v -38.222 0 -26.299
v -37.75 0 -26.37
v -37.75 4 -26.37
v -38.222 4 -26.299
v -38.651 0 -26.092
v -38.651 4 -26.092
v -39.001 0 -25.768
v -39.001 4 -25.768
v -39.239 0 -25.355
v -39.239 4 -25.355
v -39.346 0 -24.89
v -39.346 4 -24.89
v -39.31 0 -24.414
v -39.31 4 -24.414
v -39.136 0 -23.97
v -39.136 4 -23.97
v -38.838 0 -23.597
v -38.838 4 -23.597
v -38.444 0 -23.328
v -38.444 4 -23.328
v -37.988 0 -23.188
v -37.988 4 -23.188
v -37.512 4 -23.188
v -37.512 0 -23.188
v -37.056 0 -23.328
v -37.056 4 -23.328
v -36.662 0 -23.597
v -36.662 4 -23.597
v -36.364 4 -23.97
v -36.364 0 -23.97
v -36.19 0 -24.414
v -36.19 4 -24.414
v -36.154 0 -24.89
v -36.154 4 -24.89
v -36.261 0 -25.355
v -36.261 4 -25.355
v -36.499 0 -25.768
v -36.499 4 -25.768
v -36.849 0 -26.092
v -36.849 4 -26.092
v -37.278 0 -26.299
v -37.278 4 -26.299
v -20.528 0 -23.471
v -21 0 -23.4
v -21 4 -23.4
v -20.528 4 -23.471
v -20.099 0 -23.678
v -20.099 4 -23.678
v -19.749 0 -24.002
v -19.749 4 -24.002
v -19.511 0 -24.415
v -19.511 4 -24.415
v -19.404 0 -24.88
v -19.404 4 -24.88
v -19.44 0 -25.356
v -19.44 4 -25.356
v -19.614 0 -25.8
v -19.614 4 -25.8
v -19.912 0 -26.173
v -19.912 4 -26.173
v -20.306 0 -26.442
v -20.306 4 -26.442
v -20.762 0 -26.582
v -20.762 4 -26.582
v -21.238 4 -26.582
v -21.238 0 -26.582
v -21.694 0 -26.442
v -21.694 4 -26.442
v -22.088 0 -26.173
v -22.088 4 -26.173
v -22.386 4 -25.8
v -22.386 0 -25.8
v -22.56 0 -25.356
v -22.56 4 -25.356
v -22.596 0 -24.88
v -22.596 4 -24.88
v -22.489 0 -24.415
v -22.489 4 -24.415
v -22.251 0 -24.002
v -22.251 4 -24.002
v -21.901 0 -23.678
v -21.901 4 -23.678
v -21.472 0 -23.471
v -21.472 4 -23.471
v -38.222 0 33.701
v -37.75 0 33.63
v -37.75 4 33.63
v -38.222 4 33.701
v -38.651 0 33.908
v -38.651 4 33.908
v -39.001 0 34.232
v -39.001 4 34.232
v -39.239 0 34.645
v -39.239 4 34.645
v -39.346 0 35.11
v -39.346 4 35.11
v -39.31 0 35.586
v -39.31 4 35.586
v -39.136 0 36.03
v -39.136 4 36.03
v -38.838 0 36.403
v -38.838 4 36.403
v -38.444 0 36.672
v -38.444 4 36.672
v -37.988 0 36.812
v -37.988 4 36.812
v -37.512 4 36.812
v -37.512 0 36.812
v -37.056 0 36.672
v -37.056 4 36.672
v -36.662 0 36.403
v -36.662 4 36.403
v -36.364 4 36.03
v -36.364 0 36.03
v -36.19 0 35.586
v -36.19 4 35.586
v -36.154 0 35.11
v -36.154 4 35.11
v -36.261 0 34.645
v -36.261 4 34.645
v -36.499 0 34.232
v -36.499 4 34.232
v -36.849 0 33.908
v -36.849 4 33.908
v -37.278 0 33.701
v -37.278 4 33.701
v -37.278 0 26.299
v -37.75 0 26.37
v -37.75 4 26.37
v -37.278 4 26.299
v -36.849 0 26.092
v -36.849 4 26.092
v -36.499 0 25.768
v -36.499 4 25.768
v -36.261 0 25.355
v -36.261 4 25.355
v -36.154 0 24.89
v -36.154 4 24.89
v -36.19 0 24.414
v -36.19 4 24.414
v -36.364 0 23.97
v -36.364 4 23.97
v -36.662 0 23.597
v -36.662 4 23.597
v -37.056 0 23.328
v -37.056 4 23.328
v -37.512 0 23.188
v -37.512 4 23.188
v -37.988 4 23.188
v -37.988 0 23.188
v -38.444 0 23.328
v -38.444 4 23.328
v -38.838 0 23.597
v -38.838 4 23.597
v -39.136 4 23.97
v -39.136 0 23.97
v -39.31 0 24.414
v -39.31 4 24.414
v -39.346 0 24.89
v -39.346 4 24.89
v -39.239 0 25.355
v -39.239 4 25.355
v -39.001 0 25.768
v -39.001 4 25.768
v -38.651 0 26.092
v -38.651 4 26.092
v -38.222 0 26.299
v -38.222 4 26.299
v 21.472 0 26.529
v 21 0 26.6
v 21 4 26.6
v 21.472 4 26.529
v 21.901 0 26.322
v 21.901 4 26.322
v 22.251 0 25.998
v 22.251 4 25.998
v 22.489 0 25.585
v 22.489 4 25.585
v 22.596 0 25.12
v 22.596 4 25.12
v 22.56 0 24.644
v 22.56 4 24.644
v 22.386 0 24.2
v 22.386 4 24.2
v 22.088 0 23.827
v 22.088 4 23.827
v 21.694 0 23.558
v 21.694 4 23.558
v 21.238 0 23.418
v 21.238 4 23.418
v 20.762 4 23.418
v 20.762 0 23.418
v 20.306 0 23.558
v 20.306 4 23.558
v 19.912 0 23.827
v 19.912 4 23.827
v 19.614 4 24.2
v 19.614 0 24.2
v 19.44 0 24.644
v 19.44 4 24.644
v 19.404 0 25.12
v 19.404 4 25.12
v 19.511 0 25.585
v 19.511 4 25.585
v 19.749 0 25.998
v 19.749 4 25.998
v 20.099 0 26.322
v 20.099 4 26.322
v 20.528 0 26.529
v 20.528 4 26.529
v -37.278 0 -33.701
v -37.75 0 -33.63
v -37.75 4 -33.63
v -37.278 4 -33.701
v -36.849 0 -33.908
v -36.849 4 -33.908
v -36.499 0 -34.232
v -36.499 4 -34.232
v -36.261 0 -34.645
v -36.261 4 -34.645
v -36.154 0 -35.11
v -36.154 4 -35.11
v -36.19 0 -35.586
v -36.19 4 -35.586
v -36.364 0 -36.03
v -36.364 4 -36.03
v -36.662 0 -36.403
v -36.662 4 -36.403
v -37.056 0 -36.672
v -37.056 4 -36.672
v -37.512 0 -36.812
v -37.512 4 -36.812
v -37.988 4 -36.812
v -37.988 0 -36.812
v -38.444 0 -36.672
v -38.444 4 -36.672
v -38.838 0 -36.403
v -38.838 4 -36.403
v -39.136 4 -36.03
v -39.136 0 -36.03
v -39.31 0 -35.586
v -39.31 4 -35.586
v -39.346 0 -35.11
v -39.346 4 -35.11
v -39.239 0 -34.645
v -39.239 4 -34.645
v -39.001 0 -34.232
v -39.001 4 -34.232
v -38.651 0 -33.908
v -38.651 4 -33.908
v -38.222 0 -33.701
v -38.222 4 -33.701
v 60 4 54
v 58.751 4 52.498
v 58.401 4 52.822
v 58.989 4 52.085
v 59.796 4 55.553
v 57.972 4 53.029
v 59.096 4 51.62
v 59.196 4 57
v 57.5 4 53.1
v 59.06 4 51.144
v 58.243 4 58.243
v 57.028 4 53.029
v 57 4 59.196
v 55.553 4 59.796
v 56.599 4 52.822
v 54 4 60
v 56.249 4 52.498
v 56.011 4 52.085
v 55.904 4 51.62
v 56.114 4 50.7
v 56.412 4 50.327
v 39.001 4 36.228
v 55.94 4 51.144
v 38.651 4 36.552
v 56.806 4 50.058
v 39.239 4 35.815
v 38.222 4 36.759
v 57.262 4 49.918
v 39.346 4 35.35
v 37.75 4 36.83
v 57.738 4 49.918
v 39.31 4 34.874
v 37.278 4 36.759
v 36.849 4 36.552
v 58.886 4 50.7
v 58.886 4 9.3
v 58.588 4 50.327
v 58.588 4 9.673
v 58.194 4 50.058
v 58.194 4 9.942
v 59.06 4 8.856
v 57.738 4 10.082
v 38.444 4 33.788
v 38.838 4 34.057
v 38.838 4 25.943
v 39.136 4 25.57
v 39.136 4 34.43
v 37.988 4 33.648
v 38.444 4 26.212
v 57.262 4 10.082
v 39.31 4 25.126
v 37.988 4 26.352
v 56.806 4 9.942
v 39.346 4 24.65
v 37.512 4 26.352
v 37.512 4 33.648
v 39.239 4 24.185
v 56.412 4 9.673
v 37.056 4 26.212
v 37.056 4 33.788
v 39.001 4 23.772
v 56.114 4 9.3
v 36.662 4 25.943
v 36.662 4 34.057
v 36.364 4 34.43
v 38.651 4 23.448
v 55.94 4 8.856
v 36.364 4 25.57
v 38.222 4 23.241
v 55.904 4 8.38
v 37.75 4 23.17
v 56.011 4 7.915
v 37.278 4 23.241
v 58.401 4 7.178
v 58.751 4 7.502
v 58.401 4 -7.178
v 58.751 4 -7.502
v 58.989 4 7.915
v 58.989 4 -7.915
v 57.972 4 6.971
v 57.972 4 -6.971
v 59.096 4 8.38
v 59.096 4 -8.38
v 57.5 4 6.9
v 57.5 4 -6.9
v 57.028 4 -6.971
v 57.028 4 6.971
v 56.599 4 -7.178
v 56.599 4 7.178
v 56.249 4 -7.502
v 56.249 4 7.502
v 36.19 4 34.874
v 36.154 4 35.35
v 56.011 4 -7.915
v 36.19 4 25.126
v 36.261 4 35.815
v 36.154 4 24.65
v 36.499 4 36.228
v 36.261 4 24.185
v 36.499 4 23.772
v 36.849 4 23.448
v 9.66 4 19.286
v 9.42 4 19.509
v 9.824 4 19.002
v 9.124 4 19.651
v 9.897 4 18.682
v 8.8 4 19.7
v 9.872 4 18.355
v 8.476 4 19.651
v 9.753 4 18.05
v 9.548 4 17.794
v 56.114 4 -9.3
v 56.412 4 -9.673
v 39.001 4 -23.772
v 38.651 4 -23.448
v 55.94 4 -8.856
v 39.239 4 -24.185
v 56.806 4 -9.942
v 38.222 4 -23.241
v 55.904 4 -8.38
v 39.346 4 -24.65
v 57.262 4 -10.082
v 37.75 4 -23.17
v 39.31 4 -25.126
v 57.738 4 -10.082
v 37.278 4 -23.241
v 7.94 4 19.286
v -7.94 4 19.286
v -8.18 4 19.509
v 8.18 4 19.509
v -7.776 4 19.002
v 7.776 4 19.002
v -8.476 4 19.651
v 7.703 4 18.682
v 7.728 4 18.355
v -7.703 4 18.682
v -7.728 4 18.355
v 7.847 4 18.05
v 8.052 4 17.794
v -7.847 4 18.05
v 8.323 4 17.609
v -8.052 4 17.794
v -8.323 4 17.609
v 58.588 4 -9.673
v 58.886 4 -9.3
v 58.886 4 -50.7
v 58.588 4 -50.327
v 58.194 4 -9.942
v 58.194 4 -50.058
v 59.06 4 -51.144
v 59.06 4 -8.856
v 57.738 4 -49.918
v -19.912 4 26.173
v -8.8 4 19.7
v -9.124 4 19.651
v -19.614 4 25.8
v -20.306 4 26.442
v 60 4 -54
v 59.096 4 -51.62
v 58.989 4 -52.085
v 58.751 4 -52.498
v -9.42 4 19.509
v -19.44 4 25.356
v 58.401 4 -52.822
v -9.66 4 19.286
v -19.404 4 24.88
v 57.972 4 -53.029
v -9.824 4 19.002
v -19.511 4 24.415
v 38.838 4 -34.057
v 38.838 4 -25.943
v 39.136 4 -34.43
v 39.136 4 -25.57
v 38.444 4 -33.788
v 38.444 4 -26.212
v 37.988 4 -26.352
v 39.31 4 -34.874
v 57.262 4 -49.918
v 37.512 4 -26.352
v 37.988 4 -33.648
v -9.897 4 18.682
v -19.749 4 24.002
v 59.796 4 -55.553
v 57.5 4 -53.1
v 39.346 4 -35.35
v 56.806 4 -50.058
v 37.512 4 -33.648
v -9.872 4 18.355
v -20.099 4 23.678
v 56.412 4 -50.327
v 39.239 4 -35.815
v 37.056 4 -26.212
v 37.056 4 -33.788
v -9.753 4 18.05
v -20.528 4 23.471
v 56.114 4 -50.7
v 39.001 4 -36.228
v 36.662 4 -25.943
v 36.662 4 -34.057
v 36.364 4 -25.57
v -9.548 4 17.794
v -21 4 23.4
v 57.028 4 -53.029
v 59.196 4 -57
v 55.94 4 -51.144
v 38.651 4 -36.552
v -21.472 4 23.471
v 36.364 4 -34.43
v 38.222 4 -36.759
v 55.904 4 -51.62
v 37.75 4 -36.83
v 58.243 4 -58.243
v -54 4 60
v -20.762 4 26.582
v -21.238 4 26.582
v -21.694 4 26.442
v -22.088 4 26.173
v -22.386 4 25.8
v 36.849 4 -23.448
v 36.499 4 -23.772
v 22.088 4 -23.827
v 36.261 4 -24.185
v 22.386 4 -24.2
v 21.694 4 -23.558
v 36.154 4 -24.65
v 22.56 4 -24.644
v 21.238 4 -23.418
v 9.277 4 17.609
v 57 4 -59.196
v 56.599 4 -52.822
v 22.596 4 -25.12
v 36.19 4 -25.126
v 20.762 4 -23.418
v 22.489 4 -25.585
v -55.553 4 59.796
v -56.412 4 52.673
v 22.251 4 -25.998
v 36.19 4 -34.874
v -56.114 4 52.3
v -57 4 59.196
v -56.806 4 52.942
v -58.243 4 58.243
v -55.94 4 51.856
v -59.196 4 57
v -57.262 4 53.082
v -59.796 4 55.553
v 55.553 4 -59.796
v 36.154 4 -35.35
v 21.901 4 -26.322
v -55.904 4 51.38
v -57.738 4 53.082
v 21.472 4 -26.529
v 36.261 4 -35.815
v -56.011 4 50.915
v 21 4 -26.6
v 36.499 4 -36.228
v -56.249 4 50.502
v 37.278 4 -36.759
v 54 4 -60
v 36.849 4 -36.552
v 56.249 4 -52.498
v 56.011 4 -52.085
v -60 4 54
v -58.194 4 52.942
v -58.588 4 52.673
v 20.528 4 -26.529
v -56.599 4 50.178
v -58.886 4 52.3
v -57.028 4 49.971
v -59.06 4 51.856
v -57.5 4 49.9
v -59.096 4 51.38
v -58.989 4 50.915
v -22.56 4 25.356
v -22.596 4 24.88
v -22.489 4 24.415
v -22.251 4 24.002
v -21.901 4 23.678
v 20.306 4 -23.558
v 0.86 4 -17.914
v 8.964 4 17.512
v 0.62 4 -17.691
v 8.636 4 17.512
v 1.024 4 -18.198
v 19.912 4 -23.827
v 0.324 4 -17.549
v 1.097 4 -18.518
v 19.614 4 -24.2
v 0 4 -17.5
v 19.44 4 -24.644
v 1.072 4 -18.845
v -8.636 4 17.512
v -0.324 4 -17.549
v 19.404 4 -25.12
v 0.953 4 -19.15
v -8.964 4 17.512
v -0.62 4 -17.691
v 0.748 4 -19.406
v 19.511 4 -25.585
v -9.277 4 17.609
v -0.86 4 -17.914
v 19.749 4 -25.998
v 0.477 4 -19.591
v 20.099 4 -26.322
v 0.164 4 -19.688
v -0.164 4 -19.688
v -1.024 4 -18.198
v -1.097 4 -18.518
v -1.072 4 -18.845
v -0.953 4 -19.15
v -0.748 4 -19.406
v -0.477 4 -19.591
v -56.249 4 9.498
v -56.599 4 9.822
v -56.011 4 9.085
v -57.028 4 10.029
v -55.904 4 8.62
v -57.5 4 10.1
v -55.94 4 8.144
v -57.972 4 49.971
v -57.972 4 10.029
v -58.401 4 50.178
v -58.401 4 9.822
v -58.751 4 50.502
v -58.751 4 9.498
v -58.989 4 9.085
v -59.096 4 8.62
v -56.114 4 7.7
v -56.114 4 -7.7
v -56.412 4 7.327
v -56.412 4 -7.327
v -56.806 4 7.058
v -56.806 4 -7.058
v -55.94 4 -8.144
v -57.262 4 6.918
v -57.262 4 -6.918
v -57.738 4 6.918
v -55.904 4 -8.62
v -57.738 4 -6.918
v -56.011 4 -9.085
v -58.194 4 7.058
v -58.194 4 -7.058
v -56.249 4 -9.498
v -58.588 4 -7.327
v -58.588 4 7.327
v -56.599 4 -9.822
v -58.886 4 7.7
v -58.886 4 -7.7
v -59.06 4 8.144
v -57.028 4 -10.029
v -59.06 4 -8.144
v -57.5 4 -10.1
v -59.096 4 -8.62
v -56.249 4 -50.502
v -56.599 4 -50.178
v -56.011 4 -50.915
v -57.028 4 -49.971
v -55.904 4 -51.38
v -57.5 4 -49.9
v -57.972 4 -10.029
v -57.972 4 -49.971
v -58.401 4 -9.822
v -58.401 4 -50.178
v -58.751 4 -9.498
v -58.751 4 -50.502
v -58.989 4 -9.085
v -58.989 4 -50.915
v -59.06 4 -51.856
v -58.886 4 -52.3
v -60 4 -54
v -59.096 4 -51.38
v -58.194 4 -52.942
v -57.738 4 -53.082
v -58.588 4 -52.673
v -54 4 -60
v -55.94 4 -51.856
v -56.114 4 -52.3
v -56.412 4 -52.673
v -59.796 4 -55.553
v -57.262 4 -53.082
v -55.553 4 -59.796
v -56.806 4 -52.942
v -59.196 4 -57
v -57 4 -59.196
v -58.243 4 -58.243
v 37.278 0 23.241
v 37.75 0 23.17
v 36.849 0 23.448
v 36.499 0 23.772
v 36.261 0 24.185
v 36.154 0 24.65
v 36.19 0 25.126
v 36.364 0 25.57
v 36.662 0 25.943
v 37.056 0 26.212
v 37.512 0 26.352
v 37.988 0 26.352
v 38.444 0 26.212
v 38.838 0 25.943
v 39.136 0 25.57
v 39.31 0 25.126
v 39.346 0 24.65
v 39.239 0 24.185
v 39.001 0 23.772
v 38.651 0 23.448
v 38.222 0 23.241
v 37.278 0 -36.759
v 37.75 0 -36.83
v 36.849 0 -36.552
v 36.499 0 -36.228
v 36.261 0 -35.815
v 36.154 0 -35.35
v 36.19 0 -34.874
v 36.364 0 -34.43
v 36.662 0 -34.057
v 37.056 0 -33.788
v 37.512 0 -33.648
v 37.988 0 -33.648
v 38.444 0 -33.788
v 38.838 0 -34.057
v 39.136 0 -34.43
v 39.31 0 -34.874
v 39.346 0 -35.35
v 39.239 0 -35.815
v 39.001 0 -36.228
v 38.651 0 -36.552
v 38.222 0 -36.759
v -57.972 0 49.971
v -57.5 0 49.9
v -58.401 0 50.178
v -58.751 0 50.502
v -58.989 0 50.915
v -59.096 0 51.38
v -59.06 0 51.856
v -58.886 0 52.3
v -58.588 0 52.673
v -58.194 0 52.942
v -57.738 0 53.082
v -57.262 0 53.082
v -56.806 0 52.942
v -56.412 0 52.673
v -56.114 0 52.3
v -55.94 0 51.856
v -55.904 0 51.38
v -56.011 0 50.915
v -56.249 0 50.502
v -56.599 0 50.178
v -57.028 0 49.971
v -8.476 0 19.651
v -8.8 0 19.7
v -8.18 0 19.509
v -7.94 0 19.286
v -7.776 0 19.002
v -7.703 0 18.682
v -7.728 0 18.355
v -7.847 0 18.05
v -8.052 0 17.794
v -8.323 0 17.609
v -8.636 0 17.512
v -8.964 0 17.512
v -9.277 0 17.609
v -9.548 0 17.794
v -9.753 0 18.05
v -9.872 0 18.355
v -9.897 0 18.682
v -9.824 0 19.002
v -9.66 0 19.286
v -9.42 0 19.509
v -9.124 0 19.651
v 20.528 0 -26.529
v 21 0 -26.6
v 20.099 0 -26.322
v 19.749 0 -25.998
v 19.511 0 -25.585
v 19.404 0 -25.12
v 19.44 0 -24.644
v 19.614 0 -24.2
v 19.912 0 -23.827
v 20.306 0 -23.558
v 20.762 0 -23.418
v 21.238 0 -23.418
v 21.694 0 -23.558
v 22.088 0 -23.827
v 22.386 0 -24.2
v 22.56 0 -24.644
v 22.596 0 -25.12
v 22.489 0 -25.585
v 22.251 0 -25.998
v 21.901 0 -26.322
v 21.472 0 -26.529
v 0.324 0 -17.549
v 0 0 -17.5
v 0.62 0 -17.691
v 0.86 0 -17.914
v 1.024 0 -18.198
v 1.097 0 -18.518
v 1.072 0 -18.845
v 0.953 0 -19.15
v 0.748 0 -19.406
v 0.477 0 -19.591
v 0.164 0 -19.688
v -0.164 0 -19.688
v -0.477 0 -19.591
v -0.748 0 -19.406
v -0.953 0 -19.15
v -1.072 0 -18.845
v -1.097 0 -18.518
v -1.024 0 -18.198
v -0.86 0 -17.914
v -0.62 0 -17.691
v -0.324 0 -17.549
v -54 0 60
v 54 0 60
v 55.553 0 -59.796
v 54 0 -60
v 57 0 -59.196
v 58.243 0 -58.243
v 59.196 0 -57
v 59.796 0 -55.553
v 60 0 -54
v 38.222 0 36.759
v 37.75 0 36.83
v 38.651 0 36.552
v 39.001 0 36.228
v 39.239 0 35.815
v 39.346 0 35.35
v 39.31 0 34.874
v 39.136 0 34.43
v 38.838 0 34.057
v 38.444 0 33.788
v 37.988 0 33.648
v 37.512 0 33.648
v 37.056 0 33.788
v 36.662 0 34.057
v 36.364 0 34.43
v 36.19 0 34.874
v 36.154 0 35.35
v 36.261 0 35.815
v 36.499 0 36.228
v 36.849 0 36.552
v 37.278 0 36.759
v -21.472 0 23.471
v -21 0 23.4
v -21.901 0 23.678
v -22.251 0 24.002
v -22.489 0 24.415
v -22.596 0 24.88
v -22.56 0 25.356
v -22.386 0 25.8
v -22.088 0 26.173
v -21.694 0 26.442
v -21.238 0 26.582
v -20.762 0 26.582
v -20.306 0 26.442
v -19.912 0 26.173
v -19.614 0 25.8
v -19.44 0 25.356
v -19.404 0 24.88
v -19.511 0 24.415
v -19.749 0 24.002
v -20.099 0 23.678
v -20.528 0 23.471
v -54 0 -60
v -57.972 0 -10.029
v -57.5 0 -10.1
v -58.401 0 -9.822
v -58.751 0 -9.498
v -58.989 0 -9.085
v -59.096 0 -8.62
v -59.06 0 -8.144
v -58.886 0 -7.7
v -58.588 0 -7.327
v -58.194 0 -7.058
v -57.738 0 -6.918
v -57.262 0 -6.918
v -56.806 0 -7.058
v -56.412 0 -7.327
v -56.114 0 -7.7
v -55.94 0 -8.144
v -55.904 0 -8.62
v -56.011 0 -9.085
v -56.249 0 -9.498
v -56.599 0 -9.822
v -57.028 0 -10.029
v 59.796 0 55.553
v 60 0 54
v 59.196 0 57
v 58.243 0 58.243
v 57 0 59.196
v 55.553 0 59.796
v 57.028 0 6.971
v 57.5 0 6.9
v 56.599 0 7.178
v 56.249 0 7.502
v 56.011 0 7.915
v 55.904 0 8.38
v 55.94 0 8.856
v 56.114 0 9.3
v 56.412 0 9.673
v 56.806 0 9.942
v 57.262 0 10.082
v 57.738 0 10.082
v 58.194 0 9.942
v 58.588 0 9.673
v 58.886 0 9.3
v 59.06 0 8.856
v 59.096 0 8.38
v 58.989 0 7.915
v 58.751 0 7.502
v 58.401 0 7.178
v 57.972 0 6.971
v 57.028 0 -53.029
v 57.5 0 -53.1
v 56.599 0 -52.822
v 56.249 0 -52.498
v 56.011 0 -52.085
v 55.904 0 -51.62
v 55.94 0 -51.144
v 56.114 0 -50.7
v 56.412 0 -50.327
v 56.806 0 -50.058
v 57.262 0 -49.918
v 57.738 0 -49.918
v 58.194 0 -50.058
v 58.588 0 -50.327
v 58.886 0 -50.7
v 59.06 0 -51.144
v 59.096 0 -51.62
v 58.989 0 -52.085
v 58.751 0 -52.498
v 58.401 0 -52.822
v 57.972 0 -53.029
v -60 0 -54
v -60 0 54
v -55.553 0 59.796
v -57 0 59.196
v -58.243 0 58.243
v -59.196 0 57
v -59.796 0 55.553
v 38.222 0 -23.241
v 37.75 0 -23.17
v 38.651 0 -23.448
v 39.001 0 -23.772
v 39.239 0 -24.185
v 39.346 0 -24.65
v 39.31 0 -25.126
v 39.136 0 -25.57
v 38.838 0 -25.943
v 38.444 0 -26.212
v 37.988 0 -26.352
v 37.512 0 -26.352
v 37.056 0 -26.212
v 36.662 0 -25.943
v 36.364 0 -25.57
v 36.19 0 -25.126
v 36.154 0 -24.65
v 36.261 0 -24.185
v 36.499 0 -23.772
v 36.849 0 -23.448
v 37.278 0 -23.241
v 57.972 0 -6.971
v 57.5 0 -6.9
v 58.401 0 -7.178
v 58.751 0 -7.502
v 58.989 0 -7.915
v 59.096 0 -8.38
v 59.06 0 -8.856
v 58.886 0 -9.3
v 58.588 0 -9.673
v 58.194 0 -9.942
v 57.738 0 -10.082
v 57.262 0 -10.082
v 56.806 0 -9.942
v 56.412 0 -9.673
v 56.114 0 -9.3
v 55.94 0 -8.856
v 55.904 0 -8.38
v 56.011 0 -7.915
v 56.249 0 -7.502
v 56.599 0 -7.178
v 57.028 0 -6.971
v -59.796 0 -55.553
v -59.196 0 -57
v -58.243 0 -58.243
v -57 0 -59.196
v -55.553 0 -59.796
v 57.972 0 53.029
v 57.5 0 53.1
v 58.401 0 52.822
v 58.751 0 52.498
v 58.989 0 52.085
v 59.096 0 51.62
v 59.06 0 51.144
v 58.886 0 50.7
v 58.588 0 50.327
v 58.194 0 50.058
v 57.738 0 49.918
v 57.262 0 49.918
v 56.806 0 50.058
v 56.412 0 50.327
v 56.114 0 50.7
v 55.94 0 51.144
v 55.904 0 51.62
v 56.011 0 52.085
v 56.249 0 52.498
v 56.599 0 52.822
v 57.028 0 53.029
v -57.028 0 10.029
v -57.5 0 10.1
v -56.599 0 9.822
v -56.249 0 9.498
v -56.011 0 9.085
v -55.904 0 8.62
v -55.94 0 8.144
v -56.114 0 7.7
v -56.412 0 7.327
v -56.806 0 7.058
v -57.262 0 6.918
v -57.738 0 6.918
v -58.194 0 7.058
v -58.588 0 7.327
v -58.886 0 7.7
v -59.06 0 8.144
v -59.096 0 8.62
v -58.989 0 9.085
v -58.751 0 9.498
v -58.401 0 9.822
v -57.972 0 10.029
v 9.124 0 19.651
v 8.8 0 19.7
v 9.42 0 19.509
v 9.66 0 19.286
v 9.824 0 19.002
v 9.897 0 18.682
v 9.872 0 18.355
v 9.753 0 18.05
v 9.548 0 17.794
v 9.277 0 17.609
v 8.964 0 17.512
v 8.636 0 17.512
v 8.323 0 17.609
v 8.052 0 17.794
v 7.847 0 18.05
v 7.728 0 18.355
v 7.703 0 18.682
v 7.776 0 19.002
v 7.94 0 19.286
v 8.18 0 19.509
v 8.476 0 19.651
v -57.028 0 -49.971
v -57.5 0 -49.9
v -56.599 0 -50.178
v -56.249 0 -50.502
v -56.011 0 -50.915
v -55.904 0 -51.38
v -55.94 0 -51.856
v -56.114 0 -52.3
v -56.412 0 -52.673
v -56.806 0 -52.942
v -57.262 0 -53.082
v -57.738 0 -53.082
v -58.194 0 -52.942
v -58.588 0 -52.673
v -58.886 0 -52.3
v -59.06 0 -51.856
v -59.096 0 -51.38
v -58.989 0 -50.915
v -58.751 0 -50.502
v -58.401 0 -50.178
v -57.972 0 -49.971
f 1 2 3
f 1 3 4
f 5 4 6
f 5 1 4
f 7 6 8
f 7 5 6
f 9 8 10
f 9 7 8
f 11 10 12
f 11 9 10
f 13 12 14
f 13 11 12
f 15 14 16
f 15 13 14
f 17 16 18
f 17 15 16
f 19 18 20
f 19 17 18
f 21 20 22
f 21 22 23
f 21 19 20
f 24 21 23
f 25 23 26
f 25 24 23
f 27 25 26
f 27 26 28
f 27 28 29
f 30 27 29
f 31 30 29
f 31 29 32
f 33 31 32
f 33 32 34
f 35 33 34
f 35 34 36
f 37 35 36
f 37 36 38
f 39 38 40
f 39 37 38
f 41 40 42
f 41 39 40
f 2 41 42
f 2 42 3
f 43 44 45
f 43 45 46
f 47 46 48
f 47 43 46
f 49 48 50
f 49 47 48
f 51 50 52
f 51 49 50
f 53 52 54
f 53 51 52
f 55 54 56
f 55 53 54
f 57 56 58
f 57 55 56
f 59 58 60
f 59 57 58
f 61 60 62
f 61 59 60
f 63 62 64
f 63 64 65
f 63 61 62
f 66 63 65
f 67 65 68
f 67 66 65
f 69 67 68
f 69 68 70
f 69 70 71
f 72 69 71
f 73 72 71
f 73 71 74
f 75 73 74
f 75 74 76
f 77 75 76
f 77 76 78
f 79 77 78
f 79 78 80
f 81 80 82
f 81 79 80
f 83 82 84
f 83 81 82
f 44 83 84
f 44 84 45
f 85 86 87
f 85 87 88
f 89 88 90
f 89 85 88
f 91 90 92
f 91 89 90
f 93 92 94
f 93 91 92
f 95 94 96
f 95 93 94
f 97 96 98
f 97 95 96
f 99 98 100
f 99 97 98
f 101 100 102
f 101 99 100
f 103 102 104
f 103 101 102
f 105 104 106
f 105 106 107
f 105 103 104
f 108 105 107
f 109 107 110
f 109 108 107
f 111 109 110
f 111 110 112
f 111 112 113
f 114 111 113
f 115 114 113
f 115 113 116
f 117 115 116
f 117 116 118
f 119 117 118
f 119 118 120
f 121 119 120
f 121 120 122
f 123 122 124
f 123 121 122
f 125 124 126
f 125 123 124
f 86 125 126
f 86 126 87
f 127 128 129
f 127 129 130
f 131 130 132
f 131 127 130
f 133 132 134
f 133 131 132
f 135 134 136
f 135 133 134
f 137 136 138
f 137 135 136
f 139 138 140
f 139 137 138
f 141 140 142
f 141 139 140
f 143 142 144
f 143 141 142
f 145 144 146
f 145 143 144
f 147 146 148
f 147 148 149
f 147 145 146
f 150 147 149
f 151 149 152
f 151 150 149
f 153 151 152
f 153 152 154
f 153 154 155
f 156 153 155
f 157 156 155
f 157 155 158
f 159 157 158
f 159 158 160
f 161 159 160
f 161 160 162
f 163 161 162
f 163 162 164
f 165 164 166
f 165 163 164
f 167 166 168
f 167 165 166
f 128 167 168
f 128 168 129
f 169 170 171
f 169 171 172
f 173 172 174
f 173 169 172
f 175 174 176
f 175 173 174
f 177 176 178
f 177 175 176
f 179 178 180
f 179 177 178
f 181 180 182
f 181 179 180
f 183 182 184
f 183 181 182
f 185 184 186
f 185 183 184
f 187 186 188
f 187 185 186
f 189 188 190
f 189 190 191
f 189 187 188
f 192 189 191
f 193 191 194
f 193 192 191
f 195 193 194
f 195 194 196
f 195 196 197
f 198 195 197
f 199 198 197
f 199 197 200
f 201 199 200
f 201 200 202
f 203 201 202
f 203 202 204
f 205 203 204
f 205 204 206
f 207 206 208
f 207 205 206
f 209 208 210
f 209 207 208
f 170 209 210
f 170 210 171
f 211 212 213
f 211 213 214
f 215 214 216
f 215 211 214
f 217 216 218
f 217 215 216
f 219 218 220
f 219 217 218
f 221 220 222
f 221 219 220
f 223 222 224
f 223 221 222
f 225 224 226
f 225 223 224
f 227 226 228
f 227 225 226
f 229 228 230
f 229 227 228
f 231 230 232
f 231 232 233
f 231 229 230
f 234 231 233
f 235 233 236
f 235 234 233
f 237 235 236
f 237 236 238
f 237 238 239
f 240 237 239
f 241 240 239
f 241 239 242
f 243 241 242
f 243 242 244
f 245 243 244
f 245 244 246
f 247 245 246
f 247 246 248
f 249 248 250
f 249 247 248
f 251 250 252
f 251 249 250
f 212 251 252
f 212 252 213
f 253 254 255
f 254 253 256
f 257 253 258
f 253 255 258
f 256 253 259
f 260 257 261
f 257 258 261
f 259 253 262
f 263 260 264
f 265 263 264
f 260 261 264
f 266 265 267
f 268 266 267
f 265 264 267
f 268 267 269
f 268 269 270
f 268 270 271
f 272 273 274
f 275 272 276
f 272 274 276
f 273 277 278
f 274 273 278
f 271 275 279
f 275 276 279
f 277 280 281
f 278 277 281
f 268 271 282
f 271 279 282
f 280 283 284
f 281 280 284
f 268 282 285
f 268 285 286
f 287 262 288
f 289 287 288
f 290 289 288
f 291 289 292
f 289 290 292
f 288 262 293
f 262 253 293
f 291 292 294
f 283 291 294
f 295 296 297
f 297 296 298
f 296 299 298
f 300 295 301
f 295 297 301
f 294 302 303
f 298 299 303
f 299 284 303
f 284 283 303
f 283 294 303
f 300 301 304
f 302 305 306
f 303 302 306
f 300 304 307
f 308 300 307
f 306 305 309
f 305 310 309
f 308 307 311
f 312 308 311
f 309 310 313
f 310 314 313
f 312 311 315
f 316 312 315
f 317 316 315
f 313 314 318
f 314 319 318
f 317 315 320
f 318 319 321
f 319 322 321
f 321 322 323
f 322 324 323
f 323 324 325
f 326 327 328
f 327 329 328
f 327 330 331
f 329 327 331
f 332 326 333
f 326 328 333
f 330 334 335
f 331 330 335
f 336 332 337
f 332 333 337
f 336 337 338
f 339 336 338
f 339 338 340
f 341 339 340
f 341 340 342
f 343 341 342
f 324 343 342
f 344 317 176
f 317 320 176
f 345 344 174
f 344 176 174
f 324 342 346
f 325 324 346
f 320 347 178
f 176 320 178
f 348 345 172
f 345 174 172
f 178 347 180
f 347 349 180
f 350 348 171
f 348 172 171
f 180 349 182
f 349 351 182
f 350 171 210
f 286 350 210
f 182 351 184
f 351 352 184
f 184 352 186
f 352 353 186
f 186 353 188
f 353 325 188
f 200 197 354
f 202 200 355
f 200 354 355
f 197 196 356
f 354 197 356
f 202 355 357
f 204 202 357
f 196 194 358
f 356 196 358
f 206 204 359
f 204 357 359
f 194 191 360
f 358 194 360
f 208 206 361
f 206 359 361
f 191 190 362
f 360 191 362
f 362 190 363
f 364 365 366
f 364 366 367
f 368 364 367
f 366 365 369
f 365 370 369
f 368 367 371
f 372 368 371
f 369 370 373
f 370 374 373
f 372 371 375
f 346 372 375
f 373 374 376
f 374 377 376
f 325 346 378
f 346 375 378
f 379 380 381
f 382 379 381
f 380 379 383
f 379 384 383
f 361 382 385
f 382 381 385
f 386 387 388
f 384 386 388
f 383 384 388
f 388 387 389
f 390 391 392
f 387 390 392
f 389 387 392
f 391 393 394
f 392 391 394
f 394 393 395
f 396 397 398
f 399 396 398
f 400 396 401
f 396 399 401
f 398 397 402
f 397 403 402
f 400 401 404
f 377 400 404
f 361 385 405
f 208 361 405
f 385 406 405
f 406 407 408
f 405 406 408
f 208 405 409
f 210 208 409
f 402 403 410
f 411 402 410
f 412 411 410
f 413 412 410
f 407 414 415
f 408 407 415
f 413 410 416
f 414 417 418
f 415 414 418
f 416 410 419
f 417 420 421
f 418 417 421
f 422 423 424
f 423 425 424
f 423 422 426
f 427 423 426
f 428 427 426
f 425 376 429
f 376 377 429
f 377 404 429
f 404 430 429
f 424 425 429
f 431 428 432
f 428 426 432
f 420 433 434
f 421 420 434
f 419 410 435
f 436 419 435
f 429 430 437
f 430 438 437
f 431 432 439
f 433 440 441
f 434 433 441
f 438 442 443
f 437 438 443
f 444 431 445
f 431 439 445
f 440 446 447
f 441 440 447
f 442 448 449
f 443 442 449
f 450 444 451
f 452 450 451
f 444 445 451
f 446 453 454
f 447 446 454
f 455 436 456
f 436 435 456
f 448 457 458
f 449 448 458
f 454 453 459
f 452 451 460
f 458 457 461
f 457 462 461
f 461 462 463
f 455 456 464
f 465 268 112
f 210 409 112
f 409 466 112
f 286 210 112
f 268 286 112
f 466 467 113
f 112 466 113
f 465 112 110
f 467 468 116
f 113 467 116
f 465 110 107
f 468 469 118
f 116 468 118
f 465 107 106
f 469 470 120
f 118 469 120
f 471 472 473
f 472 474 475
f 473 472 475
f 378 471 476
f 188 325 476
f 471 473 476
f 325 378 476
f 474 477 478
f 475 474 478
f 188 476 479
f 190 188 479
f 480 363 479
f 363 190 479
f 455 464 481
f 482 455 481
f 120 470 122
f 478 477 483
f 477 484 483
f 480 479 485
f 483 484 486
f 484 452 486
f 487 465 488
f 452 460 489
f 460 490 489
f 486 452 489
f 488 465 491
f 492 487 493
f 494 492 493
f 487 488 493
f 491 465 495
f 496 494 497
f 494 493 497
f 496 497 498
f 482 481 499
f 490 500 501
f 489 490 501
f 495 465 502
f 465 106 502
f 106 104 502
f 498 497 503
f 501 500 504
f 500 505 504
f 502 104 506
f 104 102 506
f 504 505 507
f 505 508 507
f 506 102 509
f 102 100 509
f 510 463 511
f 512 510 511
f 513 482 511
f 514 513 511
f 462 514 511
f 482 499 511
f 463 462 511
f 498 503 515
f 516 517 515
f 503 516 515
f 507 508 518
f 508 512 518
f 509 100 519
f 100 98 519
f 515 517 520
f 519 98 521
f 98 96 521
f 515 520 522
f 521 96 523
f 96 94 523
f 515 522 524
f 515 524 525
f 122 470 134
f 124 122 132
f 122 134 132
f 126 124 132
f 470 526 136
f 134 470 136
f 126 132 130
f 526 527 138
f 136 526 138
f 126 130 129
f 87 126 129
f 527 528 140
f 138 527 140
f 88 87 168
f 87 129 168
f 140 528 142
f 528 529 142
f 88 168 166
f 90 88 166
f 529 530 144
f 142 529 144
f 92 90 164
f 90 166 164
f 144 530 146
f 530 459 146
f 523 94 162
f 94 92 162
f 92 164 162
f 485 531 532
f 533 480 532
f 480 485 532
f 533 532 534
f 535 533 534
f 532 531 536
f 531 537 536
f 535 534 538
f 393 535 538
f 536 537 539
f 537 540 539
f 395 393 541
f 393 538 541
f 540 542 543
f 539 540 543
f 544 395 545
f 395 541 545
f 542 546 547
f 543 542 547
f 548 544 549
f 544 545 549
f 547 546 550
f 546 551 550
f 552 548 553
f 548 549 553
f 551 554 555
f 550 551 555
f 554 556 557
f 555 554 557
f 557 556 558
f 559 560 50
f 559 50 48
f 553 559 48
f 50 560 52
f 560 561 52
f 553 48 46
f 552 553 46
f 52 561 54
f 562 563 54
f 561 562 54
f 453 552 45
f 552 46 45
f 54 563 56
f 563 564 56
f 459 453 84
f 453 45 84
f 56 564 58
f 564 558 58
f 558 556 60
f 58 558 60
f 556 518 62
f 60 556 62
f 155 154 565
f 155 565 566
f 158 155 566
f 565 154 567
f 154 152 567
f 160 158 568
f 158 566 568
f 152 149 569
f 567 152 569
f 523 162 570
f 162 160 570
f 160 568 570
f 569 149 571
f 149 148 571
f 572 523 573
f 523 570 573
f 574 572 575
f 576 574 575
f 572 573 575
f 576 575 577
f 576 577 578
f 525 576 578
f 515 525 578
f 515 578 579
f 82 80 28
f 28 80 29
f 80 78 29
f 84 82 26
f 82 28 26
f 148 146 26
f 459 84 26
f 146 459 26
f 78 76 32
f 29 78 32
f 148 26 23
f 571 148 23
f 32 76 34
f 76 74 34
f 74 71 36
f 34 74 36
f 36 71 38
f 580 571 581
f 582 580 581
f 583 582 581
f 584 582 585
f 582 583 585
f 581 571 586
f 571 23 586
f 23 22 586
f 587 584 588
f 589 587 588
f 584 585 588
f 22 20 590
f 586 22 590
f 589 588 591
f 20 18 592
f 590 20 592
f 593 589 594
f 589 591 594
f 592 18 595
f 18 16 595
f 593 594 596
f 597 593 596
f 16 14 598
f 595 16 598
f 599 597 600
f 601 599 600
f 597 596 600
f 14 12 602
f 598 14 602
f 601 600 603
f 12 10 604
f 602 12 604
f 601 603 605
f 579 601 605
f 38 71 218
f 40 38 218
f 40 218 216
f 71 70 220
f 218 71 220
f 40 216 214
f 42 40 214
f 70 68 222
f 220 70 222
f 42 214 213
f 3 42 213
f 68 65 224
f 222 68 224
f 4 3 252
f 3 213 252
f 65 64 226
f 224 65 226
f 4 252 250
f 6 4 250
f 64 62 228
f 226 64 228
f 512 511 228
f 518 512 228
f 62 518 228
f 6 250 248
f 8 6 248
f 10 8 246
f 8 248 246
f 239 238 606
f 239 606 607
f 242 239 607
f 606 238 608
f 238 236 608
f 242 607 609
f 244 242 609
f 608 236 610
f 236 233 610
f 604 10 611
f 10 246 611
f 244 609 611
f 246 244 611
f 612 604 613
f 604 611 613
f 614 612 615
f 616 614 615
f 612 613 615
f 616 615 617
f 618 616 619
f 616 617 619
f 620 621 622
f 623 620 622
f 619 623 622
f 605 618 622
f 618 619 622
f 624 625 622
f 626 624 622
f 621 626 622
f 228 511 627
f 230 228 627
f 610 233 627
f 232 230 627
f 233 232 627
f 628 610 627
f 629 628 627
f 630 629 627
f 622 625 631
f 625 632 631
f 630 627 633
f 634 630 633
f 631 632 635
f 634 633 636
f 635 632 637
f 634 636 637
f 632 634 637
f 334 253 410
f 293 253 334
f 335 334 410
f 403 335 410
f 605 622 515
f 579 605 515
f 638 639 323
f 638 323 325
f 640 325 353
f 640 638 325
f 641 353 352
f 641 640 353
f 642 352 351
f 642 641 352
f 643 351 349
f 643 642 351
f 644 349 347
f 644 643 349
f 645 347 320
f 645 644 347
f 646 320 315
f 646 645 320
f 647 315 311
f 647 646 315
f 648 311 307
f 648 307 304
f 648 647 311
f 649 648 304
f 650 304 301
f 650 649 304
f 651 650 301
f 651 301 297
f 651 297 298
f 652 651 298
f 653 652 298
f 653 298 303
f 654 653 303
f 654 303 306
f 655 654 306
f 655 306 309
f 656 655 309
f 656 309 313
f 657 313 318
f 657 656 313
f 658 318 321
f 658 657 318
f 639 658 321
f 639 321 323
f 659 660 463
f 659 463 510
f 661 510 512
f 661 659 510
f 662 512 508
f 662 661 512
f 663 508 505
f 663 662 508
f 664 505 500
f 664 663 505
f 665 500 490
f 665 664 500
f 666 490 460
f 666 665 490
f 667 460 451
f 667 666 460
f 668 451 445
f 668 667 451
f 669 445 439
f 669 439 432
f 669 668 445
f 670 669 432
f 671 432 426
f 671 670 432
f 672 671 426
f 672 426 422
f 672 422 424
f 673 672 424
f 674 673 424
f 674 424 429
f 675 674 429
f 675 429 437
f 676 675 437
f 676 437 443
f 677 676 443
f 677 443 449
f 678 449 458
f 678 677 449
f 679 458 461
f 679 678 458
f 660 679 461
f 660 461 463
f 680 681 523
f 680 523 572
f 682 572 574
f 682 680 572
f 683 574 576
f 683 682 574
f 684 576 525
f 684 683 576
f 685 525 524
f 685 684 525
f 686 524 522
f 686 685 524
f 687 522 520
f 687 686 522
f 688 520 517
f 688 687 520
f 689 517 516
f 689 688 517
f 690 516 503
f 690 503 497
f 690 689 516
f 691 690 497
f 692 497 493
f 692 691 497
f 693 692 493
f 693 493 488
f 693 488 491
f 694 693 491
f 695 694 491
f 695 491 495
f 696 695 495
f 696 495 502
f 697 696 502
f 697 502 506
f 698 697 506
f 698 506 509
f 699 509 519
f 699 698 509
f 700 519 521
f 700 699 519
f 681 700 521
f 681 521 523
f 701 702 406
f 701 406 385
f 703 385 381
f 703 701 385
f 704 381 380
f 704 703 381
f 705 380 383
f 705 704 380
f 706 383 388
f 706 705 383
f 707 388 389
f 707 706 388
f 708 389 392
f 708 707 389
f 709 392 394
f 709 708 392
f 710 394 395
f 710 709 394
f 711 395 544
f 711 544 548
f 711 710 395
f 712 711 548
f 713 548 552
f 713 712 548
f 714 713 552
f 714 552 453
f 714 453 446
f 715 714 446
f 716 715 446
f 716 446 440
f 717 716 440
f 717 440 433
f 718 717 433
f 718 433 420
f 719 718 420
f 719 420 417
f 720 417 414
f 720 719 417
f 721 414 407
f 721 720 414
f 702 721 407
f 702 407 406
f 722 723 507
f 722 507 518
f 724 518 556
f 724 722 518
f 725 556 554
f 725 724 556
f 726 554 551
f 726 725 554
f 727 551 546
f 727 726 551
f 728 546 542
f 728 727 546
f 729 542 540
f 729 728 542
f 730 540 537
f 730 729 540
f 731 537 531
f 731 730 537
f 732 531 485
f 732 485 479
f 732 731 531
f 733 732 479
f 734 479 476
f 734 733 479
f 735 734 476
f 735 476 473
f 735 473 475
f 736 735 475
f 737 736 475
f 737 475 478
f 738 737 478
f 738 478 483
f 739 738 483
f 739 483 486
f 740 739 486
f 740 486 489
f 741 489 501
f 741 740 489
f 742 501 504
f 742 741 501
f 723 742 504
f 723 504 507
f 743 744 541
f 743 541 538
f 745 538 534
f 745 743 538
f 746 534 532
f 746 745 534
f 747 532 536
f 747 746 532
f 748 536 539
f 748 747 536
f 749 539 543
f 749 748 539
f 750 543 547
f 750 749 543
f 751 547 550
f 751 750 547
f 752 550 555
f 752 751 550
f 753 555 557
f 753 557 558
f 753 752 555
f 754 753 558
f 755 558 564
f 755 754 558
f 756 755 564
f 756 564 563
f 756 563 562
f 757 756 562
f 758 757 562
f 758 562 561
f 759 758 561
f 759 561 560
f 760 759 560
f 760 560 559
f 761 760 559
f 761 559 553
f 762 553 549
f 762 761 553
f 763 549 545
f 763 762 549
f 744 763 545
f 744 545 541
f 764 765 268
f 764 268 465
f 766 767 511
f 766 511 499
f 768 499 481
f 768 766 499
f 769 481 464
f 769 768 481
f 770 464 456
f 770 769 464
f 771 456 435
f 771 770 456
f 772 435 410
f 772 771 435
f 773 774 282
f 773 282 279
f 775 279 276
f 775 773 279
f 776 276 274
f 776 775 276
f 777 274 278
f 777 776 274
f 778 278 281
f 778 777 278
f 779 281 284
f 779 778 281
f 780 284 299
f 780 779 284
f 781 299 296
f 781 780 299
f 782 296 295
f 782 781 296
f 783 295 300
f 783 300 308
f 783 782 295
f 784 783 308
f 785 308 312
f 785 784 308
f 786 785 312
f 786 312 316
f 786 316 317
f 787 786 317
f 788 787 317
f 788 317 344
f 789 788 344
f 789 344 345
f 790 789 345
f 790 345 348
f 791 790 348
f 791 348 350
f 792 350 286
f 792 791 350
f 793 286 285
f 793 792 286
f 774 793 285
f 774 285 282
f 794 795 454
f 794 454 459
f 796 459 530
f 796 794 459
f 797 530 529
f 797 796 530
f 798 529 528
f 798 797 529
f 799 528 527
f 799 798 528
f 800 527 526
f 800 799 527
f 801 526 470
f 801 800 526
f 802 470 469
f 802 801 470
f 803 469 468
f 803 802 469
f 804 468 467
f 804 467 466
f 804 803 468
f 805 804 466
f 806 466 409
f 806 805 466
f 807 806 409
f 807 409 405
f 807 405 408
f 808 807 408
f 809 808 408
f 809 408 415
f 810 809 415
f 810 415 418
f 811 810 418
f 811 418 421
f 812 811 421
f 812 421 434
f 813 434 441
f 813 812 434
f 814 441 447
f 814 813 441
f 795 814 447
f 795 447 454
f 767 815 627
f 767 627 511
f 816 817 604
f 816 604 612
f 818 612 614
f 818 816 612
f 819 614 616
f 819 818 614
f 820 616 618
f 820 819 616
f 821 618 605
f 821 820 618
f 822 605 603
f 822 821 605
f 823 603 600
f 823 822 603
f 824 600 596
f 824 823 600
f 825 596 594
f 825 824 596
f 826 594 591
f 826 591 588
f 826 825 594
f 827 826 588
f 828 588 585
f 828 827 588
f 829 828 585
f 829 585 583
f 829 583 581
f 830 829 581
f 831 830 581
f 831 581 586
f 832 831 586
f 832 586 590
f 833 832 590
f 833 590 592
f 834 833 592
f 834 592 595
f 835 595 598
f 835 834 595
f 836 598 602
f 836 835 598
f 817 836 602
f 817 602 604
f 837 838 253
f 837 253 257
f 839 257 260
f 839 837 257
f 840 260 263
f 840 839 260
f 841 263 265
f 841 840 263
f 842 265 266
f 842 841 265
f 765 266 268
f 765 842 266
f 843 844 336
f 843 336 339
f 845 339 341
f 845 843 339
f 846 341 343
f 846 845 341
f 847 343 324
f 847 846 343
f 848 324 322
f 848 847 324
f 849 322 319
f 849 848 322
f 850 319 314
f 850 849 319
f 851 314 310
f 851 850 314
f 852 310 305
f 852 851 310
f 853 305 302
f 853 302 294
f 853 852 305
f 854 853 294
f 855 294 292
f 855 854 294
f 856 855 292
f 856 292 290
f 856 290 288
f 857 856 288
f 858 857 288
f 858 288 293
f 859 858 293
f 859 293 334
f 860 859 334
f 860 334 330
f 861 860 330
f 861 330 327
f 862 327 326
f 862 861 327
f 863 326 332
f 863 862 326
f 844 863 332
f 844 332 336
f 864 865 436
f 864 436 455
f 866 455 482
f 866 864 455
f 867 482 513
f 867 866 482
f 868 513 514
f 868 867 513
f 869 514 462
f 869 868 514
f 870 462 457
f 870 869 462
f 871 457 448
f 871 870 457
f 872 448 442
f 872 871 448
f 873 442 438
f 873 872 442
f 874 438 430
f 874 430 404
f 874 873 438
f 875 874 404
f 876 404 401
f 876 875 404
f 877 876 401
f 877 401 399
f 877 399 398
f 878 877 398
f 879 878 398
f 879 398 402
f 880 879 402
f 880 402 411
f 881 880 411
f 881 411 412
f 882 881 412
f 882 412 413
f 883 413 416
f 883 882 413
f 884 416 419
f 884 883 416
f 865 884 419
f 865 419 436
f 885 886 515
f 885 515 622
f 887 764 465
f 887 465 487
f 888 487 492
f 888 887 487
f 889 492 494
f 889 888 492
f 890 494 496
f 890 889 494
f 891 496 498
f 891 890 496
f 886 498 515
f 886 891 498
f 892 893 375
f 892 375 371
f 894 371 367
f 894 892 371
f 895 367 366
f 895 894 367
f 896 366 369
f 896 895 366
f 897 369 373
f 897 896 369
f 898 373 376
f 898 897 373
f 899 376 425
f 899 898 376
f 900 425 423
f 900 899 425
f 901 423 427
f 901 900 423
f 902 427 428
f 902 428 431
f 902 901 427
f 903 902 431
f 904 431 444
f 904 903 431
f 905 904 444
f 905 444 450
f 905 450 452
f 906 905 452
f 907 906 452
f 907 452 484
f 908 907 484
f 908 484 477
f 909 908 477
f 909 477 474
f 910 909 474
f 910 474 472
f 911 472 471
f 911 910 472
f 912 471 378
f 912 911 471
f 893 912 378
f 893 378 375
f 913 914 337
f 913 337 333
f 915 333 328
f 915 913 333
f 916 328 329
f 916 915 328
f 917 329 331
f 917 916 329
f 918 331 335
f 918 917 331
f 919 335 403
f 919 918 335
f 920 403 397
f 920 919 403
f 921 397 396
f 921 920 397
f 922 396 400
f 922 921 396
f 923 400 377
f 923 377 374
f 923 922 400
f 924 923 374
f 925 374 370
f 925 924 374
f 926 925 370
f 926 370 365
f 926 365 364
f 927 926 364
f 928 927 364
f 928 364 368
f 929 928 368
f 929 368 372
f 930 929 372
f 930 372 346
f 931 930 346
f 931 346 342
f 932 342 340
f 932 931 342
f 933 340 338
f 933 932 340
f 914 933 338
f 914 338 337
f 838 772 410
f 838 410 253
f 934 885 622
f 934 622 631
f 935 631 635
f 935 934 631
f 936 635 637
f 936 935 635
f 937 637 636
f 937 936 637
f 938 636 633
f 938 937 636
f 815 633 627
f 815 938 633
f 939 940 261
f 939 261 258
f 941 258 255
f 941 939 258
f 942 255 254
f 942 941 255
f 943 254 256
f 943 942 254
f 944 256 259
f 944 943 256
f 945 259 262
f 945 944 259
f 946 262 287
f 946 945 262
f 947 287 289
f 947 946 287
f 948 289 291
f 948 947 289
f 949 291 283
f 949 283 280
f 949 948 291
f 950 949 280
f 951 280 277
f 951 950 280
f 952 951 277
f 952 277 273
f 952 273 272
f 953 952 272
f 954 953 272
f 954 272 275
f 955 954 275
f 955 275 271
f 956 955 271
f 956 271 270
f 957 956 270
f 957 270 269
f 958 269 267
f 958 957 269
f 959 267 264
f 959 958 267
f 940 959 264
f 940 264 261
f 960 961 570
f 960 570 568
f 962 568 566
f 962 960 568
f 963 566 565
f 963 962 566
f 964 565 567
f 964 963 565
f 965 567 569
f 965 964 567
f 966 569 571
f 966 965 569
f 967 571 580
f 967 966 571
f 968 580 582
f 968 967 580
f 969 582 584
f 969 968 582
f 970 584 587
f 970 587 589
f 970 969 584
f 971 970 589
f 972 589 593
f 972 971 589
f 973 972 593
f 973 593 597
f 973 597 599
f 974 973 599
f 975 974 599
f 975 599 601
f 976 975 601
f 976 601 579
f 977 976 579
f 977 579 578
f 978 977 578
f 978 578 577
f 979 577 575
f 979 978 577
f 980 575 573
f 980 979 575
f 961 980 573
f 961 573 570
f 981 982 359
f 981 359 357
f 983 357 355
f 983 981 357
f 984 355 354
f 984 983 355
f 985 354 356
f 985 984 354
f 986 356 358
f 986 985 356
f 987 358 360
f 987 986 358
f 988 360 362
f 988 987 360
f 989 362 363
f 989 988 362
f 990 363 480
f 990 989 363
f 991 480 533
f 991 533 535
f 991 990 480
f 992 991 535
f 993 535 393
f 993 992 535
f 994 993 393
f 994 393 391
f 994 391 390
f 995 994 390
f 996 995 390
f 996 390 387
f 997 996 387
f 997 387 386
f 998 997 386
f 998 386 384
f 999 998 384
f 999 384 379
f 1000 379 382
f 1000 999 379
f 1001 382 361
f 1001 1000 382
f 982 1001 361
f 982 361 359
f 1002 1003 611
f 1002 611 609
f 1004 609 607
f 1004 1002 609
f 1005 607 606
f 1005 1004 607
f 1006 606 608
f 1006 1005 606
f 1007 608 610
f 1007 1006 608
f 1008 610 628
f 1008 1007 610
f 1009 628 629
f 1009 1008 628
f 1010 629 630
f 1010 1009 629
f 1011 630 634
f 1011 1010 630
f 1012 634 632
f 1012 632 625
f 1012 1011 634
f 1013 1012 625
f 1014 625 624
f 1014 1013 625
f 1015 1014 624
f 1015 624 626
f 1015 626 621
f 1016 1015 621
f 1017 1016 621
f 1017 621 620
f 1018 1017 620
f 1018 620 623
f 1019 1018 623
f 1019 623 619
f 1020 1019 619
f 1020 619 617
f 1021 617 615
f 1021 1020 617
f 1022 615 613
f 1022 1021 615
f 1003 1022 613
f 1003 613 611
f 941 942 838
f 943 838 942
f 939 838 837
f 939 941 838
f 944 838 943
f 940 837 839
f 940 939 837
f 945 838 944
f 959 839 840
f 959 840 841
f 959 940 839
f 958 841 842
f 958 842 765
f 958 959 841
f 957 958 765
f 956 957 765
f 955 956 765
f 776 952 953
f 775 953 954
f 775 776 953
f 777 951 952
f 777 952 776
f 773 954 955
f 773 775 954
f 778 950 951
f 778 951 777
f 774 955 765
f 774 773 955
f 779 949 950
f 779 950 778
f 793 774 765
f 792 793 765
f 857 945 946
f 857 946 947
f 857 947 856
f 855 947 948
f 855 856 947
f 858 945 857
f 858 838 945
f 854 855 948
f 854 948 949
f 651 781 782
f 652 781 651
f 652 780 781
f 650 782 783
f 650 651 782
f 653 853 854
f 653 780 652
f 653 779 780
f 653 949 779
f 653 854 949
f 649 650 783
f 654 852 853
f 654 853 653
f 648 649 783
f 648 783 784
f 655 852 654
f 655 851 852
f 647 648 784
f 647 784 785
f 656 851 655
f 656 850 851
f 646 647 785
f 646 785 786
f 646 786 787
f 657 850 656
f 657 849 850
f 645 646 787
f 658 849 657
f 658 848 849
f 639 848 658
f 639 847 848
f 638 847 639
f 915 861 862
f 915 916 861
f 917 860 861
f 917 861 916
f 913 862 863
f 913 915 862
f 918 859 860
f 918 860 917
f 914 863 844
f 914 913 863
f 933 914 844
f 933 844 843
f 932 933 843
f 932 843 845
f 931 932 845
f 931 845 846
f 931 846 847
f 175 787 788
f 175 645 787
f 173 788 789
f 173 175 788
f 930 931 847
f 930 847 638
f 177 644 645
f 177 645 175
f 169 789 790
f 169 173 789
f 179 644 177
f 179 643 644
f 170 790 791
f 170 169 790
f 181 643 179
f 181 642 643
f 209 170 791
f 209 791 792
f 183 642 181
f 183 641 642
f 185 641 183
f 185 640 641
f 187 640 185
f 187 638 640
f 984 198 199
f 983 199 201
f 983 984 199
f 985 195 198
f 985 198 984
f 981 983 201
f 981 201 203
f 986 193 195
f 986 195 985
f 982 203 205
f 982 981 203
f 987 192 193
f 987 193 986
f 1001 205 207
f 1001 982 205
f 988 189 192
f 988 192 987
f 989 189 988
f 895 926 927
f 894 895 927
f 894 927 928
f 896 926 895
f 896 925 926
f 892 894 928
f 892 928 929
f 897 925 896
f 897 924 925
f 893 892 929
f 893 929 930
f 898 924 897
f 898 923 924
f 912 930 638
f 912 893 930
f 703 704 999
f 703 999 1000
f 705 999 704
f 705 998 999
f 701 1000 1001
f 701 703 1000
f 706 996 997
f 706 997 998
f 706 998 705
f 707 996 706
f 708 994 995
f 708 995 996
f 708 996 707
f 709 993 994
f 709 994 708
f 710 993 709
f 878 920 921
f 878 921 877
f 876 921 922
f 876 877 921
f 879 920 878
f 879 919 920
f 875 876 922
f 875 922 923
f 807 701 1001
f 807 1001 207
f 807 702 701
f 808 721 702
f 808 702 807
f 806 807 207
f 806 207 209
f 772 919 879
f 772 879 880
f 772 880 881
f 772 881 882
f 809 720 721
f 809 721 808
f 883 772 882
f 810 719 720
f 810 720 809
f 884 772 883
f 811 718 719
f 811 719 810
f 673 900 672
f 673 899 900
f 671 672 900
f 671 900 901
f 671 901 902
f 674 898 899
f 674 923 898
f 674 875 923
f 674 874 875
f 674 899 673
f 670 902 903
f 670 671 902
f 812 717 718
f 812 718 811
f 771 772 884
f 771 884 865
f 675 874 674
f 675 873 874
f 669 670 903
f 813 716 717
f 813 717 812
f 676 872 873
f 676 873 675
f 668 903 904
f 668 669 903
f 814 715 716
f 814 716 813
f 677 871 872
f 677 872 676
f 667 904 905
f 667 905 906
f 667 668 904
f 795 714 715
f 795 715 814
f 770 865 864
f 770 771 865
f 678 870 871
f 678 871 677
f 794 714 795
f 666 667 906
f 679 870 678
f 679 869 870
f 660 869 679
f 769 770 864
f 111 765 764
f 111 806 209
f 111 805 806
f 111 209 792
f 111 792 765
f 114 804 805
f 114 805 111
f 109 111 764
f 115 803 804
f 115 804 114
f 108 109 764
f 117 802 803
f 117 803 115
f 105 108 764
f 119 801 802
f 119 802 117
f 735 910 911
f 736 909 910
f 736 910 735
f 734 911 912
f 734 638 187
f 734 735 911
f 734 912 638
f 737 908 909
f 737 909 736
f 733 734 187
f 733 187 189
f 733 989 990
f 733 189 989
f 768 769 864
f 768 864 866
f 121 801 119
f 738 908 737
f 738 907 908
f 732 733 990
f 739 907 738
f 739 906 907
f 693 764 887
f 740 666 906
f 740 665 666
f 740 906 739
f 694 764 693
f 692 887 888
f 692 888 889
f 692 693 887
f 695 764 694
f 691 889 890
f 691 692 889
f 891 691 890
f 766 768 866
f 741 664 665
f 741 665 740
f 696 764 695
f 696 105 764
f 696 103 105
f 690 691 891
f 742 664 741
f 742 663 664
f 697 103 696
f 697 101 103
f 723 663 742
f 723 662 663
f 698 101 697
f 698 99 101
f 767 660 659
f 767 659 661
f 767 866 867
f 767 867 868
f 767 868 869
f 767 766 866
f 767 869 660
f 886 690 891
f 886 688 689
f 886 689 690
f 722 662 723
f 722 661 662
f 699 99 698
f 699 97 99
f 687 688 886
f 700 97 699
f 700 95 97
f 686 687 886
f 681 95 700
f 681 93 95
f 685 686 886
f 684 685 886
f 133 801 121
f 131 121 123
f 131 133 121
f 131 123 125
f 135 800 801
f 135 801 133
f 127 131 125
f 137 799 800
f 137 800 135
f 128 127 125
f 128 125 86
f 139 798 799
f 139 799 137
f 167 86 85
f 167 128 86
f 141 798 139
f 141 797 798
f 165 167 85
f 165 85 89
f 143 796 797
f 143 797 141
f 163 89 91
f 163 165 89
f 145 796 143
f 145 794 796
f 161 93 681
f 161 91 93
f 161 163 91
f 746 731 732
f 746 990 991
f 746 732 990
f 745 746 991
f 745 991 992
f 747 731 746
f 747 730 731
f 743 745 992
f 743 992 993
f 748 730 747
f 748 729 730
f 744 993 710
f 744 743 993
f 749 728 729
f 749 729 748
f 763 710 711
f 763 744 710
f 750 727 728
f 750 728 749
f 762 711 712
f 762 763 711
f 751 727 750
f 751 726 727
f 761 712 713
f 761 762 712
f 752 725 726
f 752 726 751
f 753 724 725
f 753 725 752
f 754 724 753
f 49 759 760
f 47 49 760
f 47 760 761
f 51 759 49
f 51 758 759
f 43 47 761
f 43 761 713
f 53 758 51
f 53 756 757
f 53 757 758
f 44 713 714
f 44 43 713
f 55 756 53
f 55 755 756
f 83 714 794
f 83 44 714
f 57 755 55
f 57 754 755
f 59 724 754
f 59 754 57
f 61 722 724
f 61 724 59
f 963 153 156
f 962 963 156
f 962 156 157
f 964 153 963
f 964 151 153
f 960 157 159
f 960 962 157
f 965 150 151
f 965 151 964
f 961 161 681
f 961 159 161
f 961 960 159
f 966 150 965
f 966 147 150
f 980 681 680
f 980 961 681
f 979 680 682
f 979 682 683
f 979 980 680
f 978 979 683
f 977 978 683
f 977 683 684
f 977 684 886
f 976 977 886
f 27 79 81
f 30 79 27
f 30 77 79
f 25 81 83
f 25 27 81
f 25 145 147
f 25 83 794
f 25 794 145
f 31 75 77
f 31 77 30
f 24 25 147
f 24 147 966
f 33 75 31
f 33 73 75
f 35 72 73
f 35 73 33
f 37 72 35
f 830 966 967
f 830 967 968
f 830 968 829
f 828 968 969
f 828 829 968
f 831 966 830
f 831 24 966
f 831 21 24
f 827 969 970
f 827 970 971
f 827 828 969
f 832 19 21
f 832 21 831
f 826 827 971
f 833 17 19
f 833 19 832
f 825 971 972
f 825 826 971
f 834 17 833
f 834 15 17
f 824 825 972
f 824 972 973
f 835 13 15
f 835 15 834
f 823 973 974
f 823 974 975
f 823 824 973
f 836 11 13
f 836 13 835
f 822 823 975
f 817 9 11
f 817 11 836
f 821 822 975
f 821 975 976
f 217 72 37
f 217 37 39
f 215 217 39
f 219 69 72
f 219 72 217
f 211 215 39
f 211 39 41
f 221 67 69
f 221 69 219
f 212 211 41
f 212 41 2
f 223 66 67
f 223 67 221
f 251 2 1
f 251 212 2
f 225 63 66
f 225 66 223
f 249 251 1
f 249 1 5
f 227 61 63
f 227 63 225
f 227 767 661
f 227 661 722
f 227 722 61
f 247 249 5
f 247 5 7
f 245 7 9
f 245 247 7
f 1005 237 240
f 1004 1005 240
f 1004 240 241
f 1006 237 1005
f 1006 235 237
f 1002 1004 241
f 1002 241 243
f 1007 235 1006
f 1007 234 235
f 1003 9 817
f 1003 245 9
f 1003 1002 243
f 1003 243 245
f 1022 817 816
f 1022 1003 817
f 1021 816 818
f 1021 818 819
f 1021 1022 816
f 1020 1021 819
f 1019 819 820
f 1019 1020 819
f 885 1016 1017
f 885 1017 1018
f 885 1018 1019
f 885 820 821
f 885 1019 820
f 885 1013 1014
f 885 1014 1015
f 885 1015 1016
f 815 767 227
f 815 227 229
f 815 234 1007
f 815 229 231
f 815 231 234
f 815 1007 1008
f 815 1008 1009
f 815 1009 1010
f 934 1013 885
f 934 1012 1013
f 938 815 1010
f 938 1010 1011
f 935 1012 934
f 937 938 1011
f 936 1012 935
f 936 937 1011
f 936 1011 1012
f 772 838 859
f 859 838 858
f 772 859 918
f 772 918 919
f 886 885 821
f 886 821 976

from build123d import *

# Parameters (mm, degrees)
SKETCH_1_R      = 1.6
SKETCH_1_R_2    = 1.1
EXTRUDE_1_DEPTH = 4


with BuildPart() as part:
    # 草图1 → 凸台-拉伸1 (new body)
    with BuildSketch(Plane(origin=(0, 0, 0), x_dir=(1, 0, 0), z_dir=(0, 1, 0))):
        with BuildLine():
            Line((-54, 60), (54, 60))
            ThreePointArc((54, 60), (58.242640687, 58.242640687), (60, 54))
            Line((60, 54), (60, -54))
            ThreePointArc((60, -54), (58.242640687, -58.242640687), (54, -60))
            Line((54, -60), (-54, -60))
            ThreePointArc((-54, -60), (-58.242640687, -58.242640687), (-60, -54))
            Line((-60, -54), (-60, 54))
            ThreePointArc((-60, 54), (-58.242640687, 58.242640687), (-54, 60))
        make_face()
        with Locations(Location((-57.5, 51.5, 0), (0, 0, 270))):
            Circle(SKETCH_1_R, mode=Mode.SUBTRACT)
        with Locations(Location((-57.5, 8.5, 0), (0, 0, 90))):
            Circle(SKETCH_1_R, mode=Mode.SUBTRACT)
        with Locations(Location((-37.75, 35.23, 0), (0, 0, 270))):
            Circle(SKETCH_1_R, mode=Mode.SUBTRACT)
        with Locations(Location((-37.75, 24.77, 0), (0, 0, 90))):
            Circle(SKETCH_1_R, mode=Mode.SUBTRACT)
        with Locations(Location((-57.5, -8.5, 0), (0, 0, 270))):
            Circle(SKETCH_1_R, mode=Mode.SUBTRACT)
        with Locations(Location((-37.75, -24.77, 0), (0, 0, 270))):
            Circle(SKETCH_1_R, mode=Mode.SUBTRACT)
        with Locations(Location((-37.75, -35.23, 0), (0, 0, 90))):
            Circle(SKETCH_1_R, mode=Mode.SUBTRACT)
        with Locations(Location((-57.5, -51.5, 0), (0, 0, 90))):
            Circle(SKETCH_1_R, mode=Mode.SUBTRACT)
        with Locations(Location((57.5, -51.5, 0), (0, 0, 270))):
            Circle(SKETCH_1_R, mode=Mode.SUBTRACT)
        with Locations(Location((37.75, -35.23, 0), (0, 0, 270))):
            Circle(SKETCH_1_R, mode=Mode.SUBTRACT)
        with Locations(Location((37.75, -24.77, 0), (0, 0, 90))):
            Circle(SKETCH_1_R, mode=Mode.SUBTRACT)
        with Locations(Location((57.5, -8.5, 0), (0, 0, 90))):
            Circle(SKETCH_1_R, mode=Mode.SUBTRACT)
        with Locations(Location((57.5, 8.5, 0), (0, 0, 270))):
            Circle(SKETCH_1_R, mode=Mode.SUBTRACT)
        with Locations(Location((37.75, 24.77, 0), (0, 0, 270))):
            Circle(SKETCH_1_R, mode=Mode.SUBTRACT)
        with Locations(Location((37.75, 35.23, 0), (0, 0, 90))):
            Circle(SKETCH_1_R, mode=Mode.SUBTRACT)
        with Locations(Location((57.5, 51.5, 0), (0, 0, 90))):
            Circle(SKETCH_1_R, mode=Mode.SUBTRACT)
        with Locations(Location((0, 18.6, 0), (0, 0, 270))):
            Circle(SKETCH_1_R_2, mode=Mode.SUBTRACT)
        with Locations(Location((8.8, -18.6, 0), (0, 0, 270))):
            Circle(SKETCH_1_R_2, mode=Mode.SUBTRACT)
        with Locations(Location((-8.8, -18.6, 0), (0, 0, 270))):
            Circle(SKETCH_1_R_2, mode=Mode.SUBTRACT)
        with Locations(Location((-21, 25, 0), (0, 0, 270))):
            Circle(SKETCH_1_R, mode=Mode.SUBTRACT)
        with Locations(Location((21, 25, 0), (0, 0, 90))):
            Circle(SKETCH_1_R, mode=Mode.SUBTRACT)
        with Locations(Location((21, -25, 0), (0, 0, 270))):
            Circle(SKETCH_1_R, mode=Mode.SUBTRACT)
        with Locations(Location((-21, -25, 0), (0, 0, 90))):
            Circle(SKETCH_1_R, mode=Mode.SUBTRACT)
    extrude(amount=EXTRUDE_1_DEPTH)


solid = part.part
